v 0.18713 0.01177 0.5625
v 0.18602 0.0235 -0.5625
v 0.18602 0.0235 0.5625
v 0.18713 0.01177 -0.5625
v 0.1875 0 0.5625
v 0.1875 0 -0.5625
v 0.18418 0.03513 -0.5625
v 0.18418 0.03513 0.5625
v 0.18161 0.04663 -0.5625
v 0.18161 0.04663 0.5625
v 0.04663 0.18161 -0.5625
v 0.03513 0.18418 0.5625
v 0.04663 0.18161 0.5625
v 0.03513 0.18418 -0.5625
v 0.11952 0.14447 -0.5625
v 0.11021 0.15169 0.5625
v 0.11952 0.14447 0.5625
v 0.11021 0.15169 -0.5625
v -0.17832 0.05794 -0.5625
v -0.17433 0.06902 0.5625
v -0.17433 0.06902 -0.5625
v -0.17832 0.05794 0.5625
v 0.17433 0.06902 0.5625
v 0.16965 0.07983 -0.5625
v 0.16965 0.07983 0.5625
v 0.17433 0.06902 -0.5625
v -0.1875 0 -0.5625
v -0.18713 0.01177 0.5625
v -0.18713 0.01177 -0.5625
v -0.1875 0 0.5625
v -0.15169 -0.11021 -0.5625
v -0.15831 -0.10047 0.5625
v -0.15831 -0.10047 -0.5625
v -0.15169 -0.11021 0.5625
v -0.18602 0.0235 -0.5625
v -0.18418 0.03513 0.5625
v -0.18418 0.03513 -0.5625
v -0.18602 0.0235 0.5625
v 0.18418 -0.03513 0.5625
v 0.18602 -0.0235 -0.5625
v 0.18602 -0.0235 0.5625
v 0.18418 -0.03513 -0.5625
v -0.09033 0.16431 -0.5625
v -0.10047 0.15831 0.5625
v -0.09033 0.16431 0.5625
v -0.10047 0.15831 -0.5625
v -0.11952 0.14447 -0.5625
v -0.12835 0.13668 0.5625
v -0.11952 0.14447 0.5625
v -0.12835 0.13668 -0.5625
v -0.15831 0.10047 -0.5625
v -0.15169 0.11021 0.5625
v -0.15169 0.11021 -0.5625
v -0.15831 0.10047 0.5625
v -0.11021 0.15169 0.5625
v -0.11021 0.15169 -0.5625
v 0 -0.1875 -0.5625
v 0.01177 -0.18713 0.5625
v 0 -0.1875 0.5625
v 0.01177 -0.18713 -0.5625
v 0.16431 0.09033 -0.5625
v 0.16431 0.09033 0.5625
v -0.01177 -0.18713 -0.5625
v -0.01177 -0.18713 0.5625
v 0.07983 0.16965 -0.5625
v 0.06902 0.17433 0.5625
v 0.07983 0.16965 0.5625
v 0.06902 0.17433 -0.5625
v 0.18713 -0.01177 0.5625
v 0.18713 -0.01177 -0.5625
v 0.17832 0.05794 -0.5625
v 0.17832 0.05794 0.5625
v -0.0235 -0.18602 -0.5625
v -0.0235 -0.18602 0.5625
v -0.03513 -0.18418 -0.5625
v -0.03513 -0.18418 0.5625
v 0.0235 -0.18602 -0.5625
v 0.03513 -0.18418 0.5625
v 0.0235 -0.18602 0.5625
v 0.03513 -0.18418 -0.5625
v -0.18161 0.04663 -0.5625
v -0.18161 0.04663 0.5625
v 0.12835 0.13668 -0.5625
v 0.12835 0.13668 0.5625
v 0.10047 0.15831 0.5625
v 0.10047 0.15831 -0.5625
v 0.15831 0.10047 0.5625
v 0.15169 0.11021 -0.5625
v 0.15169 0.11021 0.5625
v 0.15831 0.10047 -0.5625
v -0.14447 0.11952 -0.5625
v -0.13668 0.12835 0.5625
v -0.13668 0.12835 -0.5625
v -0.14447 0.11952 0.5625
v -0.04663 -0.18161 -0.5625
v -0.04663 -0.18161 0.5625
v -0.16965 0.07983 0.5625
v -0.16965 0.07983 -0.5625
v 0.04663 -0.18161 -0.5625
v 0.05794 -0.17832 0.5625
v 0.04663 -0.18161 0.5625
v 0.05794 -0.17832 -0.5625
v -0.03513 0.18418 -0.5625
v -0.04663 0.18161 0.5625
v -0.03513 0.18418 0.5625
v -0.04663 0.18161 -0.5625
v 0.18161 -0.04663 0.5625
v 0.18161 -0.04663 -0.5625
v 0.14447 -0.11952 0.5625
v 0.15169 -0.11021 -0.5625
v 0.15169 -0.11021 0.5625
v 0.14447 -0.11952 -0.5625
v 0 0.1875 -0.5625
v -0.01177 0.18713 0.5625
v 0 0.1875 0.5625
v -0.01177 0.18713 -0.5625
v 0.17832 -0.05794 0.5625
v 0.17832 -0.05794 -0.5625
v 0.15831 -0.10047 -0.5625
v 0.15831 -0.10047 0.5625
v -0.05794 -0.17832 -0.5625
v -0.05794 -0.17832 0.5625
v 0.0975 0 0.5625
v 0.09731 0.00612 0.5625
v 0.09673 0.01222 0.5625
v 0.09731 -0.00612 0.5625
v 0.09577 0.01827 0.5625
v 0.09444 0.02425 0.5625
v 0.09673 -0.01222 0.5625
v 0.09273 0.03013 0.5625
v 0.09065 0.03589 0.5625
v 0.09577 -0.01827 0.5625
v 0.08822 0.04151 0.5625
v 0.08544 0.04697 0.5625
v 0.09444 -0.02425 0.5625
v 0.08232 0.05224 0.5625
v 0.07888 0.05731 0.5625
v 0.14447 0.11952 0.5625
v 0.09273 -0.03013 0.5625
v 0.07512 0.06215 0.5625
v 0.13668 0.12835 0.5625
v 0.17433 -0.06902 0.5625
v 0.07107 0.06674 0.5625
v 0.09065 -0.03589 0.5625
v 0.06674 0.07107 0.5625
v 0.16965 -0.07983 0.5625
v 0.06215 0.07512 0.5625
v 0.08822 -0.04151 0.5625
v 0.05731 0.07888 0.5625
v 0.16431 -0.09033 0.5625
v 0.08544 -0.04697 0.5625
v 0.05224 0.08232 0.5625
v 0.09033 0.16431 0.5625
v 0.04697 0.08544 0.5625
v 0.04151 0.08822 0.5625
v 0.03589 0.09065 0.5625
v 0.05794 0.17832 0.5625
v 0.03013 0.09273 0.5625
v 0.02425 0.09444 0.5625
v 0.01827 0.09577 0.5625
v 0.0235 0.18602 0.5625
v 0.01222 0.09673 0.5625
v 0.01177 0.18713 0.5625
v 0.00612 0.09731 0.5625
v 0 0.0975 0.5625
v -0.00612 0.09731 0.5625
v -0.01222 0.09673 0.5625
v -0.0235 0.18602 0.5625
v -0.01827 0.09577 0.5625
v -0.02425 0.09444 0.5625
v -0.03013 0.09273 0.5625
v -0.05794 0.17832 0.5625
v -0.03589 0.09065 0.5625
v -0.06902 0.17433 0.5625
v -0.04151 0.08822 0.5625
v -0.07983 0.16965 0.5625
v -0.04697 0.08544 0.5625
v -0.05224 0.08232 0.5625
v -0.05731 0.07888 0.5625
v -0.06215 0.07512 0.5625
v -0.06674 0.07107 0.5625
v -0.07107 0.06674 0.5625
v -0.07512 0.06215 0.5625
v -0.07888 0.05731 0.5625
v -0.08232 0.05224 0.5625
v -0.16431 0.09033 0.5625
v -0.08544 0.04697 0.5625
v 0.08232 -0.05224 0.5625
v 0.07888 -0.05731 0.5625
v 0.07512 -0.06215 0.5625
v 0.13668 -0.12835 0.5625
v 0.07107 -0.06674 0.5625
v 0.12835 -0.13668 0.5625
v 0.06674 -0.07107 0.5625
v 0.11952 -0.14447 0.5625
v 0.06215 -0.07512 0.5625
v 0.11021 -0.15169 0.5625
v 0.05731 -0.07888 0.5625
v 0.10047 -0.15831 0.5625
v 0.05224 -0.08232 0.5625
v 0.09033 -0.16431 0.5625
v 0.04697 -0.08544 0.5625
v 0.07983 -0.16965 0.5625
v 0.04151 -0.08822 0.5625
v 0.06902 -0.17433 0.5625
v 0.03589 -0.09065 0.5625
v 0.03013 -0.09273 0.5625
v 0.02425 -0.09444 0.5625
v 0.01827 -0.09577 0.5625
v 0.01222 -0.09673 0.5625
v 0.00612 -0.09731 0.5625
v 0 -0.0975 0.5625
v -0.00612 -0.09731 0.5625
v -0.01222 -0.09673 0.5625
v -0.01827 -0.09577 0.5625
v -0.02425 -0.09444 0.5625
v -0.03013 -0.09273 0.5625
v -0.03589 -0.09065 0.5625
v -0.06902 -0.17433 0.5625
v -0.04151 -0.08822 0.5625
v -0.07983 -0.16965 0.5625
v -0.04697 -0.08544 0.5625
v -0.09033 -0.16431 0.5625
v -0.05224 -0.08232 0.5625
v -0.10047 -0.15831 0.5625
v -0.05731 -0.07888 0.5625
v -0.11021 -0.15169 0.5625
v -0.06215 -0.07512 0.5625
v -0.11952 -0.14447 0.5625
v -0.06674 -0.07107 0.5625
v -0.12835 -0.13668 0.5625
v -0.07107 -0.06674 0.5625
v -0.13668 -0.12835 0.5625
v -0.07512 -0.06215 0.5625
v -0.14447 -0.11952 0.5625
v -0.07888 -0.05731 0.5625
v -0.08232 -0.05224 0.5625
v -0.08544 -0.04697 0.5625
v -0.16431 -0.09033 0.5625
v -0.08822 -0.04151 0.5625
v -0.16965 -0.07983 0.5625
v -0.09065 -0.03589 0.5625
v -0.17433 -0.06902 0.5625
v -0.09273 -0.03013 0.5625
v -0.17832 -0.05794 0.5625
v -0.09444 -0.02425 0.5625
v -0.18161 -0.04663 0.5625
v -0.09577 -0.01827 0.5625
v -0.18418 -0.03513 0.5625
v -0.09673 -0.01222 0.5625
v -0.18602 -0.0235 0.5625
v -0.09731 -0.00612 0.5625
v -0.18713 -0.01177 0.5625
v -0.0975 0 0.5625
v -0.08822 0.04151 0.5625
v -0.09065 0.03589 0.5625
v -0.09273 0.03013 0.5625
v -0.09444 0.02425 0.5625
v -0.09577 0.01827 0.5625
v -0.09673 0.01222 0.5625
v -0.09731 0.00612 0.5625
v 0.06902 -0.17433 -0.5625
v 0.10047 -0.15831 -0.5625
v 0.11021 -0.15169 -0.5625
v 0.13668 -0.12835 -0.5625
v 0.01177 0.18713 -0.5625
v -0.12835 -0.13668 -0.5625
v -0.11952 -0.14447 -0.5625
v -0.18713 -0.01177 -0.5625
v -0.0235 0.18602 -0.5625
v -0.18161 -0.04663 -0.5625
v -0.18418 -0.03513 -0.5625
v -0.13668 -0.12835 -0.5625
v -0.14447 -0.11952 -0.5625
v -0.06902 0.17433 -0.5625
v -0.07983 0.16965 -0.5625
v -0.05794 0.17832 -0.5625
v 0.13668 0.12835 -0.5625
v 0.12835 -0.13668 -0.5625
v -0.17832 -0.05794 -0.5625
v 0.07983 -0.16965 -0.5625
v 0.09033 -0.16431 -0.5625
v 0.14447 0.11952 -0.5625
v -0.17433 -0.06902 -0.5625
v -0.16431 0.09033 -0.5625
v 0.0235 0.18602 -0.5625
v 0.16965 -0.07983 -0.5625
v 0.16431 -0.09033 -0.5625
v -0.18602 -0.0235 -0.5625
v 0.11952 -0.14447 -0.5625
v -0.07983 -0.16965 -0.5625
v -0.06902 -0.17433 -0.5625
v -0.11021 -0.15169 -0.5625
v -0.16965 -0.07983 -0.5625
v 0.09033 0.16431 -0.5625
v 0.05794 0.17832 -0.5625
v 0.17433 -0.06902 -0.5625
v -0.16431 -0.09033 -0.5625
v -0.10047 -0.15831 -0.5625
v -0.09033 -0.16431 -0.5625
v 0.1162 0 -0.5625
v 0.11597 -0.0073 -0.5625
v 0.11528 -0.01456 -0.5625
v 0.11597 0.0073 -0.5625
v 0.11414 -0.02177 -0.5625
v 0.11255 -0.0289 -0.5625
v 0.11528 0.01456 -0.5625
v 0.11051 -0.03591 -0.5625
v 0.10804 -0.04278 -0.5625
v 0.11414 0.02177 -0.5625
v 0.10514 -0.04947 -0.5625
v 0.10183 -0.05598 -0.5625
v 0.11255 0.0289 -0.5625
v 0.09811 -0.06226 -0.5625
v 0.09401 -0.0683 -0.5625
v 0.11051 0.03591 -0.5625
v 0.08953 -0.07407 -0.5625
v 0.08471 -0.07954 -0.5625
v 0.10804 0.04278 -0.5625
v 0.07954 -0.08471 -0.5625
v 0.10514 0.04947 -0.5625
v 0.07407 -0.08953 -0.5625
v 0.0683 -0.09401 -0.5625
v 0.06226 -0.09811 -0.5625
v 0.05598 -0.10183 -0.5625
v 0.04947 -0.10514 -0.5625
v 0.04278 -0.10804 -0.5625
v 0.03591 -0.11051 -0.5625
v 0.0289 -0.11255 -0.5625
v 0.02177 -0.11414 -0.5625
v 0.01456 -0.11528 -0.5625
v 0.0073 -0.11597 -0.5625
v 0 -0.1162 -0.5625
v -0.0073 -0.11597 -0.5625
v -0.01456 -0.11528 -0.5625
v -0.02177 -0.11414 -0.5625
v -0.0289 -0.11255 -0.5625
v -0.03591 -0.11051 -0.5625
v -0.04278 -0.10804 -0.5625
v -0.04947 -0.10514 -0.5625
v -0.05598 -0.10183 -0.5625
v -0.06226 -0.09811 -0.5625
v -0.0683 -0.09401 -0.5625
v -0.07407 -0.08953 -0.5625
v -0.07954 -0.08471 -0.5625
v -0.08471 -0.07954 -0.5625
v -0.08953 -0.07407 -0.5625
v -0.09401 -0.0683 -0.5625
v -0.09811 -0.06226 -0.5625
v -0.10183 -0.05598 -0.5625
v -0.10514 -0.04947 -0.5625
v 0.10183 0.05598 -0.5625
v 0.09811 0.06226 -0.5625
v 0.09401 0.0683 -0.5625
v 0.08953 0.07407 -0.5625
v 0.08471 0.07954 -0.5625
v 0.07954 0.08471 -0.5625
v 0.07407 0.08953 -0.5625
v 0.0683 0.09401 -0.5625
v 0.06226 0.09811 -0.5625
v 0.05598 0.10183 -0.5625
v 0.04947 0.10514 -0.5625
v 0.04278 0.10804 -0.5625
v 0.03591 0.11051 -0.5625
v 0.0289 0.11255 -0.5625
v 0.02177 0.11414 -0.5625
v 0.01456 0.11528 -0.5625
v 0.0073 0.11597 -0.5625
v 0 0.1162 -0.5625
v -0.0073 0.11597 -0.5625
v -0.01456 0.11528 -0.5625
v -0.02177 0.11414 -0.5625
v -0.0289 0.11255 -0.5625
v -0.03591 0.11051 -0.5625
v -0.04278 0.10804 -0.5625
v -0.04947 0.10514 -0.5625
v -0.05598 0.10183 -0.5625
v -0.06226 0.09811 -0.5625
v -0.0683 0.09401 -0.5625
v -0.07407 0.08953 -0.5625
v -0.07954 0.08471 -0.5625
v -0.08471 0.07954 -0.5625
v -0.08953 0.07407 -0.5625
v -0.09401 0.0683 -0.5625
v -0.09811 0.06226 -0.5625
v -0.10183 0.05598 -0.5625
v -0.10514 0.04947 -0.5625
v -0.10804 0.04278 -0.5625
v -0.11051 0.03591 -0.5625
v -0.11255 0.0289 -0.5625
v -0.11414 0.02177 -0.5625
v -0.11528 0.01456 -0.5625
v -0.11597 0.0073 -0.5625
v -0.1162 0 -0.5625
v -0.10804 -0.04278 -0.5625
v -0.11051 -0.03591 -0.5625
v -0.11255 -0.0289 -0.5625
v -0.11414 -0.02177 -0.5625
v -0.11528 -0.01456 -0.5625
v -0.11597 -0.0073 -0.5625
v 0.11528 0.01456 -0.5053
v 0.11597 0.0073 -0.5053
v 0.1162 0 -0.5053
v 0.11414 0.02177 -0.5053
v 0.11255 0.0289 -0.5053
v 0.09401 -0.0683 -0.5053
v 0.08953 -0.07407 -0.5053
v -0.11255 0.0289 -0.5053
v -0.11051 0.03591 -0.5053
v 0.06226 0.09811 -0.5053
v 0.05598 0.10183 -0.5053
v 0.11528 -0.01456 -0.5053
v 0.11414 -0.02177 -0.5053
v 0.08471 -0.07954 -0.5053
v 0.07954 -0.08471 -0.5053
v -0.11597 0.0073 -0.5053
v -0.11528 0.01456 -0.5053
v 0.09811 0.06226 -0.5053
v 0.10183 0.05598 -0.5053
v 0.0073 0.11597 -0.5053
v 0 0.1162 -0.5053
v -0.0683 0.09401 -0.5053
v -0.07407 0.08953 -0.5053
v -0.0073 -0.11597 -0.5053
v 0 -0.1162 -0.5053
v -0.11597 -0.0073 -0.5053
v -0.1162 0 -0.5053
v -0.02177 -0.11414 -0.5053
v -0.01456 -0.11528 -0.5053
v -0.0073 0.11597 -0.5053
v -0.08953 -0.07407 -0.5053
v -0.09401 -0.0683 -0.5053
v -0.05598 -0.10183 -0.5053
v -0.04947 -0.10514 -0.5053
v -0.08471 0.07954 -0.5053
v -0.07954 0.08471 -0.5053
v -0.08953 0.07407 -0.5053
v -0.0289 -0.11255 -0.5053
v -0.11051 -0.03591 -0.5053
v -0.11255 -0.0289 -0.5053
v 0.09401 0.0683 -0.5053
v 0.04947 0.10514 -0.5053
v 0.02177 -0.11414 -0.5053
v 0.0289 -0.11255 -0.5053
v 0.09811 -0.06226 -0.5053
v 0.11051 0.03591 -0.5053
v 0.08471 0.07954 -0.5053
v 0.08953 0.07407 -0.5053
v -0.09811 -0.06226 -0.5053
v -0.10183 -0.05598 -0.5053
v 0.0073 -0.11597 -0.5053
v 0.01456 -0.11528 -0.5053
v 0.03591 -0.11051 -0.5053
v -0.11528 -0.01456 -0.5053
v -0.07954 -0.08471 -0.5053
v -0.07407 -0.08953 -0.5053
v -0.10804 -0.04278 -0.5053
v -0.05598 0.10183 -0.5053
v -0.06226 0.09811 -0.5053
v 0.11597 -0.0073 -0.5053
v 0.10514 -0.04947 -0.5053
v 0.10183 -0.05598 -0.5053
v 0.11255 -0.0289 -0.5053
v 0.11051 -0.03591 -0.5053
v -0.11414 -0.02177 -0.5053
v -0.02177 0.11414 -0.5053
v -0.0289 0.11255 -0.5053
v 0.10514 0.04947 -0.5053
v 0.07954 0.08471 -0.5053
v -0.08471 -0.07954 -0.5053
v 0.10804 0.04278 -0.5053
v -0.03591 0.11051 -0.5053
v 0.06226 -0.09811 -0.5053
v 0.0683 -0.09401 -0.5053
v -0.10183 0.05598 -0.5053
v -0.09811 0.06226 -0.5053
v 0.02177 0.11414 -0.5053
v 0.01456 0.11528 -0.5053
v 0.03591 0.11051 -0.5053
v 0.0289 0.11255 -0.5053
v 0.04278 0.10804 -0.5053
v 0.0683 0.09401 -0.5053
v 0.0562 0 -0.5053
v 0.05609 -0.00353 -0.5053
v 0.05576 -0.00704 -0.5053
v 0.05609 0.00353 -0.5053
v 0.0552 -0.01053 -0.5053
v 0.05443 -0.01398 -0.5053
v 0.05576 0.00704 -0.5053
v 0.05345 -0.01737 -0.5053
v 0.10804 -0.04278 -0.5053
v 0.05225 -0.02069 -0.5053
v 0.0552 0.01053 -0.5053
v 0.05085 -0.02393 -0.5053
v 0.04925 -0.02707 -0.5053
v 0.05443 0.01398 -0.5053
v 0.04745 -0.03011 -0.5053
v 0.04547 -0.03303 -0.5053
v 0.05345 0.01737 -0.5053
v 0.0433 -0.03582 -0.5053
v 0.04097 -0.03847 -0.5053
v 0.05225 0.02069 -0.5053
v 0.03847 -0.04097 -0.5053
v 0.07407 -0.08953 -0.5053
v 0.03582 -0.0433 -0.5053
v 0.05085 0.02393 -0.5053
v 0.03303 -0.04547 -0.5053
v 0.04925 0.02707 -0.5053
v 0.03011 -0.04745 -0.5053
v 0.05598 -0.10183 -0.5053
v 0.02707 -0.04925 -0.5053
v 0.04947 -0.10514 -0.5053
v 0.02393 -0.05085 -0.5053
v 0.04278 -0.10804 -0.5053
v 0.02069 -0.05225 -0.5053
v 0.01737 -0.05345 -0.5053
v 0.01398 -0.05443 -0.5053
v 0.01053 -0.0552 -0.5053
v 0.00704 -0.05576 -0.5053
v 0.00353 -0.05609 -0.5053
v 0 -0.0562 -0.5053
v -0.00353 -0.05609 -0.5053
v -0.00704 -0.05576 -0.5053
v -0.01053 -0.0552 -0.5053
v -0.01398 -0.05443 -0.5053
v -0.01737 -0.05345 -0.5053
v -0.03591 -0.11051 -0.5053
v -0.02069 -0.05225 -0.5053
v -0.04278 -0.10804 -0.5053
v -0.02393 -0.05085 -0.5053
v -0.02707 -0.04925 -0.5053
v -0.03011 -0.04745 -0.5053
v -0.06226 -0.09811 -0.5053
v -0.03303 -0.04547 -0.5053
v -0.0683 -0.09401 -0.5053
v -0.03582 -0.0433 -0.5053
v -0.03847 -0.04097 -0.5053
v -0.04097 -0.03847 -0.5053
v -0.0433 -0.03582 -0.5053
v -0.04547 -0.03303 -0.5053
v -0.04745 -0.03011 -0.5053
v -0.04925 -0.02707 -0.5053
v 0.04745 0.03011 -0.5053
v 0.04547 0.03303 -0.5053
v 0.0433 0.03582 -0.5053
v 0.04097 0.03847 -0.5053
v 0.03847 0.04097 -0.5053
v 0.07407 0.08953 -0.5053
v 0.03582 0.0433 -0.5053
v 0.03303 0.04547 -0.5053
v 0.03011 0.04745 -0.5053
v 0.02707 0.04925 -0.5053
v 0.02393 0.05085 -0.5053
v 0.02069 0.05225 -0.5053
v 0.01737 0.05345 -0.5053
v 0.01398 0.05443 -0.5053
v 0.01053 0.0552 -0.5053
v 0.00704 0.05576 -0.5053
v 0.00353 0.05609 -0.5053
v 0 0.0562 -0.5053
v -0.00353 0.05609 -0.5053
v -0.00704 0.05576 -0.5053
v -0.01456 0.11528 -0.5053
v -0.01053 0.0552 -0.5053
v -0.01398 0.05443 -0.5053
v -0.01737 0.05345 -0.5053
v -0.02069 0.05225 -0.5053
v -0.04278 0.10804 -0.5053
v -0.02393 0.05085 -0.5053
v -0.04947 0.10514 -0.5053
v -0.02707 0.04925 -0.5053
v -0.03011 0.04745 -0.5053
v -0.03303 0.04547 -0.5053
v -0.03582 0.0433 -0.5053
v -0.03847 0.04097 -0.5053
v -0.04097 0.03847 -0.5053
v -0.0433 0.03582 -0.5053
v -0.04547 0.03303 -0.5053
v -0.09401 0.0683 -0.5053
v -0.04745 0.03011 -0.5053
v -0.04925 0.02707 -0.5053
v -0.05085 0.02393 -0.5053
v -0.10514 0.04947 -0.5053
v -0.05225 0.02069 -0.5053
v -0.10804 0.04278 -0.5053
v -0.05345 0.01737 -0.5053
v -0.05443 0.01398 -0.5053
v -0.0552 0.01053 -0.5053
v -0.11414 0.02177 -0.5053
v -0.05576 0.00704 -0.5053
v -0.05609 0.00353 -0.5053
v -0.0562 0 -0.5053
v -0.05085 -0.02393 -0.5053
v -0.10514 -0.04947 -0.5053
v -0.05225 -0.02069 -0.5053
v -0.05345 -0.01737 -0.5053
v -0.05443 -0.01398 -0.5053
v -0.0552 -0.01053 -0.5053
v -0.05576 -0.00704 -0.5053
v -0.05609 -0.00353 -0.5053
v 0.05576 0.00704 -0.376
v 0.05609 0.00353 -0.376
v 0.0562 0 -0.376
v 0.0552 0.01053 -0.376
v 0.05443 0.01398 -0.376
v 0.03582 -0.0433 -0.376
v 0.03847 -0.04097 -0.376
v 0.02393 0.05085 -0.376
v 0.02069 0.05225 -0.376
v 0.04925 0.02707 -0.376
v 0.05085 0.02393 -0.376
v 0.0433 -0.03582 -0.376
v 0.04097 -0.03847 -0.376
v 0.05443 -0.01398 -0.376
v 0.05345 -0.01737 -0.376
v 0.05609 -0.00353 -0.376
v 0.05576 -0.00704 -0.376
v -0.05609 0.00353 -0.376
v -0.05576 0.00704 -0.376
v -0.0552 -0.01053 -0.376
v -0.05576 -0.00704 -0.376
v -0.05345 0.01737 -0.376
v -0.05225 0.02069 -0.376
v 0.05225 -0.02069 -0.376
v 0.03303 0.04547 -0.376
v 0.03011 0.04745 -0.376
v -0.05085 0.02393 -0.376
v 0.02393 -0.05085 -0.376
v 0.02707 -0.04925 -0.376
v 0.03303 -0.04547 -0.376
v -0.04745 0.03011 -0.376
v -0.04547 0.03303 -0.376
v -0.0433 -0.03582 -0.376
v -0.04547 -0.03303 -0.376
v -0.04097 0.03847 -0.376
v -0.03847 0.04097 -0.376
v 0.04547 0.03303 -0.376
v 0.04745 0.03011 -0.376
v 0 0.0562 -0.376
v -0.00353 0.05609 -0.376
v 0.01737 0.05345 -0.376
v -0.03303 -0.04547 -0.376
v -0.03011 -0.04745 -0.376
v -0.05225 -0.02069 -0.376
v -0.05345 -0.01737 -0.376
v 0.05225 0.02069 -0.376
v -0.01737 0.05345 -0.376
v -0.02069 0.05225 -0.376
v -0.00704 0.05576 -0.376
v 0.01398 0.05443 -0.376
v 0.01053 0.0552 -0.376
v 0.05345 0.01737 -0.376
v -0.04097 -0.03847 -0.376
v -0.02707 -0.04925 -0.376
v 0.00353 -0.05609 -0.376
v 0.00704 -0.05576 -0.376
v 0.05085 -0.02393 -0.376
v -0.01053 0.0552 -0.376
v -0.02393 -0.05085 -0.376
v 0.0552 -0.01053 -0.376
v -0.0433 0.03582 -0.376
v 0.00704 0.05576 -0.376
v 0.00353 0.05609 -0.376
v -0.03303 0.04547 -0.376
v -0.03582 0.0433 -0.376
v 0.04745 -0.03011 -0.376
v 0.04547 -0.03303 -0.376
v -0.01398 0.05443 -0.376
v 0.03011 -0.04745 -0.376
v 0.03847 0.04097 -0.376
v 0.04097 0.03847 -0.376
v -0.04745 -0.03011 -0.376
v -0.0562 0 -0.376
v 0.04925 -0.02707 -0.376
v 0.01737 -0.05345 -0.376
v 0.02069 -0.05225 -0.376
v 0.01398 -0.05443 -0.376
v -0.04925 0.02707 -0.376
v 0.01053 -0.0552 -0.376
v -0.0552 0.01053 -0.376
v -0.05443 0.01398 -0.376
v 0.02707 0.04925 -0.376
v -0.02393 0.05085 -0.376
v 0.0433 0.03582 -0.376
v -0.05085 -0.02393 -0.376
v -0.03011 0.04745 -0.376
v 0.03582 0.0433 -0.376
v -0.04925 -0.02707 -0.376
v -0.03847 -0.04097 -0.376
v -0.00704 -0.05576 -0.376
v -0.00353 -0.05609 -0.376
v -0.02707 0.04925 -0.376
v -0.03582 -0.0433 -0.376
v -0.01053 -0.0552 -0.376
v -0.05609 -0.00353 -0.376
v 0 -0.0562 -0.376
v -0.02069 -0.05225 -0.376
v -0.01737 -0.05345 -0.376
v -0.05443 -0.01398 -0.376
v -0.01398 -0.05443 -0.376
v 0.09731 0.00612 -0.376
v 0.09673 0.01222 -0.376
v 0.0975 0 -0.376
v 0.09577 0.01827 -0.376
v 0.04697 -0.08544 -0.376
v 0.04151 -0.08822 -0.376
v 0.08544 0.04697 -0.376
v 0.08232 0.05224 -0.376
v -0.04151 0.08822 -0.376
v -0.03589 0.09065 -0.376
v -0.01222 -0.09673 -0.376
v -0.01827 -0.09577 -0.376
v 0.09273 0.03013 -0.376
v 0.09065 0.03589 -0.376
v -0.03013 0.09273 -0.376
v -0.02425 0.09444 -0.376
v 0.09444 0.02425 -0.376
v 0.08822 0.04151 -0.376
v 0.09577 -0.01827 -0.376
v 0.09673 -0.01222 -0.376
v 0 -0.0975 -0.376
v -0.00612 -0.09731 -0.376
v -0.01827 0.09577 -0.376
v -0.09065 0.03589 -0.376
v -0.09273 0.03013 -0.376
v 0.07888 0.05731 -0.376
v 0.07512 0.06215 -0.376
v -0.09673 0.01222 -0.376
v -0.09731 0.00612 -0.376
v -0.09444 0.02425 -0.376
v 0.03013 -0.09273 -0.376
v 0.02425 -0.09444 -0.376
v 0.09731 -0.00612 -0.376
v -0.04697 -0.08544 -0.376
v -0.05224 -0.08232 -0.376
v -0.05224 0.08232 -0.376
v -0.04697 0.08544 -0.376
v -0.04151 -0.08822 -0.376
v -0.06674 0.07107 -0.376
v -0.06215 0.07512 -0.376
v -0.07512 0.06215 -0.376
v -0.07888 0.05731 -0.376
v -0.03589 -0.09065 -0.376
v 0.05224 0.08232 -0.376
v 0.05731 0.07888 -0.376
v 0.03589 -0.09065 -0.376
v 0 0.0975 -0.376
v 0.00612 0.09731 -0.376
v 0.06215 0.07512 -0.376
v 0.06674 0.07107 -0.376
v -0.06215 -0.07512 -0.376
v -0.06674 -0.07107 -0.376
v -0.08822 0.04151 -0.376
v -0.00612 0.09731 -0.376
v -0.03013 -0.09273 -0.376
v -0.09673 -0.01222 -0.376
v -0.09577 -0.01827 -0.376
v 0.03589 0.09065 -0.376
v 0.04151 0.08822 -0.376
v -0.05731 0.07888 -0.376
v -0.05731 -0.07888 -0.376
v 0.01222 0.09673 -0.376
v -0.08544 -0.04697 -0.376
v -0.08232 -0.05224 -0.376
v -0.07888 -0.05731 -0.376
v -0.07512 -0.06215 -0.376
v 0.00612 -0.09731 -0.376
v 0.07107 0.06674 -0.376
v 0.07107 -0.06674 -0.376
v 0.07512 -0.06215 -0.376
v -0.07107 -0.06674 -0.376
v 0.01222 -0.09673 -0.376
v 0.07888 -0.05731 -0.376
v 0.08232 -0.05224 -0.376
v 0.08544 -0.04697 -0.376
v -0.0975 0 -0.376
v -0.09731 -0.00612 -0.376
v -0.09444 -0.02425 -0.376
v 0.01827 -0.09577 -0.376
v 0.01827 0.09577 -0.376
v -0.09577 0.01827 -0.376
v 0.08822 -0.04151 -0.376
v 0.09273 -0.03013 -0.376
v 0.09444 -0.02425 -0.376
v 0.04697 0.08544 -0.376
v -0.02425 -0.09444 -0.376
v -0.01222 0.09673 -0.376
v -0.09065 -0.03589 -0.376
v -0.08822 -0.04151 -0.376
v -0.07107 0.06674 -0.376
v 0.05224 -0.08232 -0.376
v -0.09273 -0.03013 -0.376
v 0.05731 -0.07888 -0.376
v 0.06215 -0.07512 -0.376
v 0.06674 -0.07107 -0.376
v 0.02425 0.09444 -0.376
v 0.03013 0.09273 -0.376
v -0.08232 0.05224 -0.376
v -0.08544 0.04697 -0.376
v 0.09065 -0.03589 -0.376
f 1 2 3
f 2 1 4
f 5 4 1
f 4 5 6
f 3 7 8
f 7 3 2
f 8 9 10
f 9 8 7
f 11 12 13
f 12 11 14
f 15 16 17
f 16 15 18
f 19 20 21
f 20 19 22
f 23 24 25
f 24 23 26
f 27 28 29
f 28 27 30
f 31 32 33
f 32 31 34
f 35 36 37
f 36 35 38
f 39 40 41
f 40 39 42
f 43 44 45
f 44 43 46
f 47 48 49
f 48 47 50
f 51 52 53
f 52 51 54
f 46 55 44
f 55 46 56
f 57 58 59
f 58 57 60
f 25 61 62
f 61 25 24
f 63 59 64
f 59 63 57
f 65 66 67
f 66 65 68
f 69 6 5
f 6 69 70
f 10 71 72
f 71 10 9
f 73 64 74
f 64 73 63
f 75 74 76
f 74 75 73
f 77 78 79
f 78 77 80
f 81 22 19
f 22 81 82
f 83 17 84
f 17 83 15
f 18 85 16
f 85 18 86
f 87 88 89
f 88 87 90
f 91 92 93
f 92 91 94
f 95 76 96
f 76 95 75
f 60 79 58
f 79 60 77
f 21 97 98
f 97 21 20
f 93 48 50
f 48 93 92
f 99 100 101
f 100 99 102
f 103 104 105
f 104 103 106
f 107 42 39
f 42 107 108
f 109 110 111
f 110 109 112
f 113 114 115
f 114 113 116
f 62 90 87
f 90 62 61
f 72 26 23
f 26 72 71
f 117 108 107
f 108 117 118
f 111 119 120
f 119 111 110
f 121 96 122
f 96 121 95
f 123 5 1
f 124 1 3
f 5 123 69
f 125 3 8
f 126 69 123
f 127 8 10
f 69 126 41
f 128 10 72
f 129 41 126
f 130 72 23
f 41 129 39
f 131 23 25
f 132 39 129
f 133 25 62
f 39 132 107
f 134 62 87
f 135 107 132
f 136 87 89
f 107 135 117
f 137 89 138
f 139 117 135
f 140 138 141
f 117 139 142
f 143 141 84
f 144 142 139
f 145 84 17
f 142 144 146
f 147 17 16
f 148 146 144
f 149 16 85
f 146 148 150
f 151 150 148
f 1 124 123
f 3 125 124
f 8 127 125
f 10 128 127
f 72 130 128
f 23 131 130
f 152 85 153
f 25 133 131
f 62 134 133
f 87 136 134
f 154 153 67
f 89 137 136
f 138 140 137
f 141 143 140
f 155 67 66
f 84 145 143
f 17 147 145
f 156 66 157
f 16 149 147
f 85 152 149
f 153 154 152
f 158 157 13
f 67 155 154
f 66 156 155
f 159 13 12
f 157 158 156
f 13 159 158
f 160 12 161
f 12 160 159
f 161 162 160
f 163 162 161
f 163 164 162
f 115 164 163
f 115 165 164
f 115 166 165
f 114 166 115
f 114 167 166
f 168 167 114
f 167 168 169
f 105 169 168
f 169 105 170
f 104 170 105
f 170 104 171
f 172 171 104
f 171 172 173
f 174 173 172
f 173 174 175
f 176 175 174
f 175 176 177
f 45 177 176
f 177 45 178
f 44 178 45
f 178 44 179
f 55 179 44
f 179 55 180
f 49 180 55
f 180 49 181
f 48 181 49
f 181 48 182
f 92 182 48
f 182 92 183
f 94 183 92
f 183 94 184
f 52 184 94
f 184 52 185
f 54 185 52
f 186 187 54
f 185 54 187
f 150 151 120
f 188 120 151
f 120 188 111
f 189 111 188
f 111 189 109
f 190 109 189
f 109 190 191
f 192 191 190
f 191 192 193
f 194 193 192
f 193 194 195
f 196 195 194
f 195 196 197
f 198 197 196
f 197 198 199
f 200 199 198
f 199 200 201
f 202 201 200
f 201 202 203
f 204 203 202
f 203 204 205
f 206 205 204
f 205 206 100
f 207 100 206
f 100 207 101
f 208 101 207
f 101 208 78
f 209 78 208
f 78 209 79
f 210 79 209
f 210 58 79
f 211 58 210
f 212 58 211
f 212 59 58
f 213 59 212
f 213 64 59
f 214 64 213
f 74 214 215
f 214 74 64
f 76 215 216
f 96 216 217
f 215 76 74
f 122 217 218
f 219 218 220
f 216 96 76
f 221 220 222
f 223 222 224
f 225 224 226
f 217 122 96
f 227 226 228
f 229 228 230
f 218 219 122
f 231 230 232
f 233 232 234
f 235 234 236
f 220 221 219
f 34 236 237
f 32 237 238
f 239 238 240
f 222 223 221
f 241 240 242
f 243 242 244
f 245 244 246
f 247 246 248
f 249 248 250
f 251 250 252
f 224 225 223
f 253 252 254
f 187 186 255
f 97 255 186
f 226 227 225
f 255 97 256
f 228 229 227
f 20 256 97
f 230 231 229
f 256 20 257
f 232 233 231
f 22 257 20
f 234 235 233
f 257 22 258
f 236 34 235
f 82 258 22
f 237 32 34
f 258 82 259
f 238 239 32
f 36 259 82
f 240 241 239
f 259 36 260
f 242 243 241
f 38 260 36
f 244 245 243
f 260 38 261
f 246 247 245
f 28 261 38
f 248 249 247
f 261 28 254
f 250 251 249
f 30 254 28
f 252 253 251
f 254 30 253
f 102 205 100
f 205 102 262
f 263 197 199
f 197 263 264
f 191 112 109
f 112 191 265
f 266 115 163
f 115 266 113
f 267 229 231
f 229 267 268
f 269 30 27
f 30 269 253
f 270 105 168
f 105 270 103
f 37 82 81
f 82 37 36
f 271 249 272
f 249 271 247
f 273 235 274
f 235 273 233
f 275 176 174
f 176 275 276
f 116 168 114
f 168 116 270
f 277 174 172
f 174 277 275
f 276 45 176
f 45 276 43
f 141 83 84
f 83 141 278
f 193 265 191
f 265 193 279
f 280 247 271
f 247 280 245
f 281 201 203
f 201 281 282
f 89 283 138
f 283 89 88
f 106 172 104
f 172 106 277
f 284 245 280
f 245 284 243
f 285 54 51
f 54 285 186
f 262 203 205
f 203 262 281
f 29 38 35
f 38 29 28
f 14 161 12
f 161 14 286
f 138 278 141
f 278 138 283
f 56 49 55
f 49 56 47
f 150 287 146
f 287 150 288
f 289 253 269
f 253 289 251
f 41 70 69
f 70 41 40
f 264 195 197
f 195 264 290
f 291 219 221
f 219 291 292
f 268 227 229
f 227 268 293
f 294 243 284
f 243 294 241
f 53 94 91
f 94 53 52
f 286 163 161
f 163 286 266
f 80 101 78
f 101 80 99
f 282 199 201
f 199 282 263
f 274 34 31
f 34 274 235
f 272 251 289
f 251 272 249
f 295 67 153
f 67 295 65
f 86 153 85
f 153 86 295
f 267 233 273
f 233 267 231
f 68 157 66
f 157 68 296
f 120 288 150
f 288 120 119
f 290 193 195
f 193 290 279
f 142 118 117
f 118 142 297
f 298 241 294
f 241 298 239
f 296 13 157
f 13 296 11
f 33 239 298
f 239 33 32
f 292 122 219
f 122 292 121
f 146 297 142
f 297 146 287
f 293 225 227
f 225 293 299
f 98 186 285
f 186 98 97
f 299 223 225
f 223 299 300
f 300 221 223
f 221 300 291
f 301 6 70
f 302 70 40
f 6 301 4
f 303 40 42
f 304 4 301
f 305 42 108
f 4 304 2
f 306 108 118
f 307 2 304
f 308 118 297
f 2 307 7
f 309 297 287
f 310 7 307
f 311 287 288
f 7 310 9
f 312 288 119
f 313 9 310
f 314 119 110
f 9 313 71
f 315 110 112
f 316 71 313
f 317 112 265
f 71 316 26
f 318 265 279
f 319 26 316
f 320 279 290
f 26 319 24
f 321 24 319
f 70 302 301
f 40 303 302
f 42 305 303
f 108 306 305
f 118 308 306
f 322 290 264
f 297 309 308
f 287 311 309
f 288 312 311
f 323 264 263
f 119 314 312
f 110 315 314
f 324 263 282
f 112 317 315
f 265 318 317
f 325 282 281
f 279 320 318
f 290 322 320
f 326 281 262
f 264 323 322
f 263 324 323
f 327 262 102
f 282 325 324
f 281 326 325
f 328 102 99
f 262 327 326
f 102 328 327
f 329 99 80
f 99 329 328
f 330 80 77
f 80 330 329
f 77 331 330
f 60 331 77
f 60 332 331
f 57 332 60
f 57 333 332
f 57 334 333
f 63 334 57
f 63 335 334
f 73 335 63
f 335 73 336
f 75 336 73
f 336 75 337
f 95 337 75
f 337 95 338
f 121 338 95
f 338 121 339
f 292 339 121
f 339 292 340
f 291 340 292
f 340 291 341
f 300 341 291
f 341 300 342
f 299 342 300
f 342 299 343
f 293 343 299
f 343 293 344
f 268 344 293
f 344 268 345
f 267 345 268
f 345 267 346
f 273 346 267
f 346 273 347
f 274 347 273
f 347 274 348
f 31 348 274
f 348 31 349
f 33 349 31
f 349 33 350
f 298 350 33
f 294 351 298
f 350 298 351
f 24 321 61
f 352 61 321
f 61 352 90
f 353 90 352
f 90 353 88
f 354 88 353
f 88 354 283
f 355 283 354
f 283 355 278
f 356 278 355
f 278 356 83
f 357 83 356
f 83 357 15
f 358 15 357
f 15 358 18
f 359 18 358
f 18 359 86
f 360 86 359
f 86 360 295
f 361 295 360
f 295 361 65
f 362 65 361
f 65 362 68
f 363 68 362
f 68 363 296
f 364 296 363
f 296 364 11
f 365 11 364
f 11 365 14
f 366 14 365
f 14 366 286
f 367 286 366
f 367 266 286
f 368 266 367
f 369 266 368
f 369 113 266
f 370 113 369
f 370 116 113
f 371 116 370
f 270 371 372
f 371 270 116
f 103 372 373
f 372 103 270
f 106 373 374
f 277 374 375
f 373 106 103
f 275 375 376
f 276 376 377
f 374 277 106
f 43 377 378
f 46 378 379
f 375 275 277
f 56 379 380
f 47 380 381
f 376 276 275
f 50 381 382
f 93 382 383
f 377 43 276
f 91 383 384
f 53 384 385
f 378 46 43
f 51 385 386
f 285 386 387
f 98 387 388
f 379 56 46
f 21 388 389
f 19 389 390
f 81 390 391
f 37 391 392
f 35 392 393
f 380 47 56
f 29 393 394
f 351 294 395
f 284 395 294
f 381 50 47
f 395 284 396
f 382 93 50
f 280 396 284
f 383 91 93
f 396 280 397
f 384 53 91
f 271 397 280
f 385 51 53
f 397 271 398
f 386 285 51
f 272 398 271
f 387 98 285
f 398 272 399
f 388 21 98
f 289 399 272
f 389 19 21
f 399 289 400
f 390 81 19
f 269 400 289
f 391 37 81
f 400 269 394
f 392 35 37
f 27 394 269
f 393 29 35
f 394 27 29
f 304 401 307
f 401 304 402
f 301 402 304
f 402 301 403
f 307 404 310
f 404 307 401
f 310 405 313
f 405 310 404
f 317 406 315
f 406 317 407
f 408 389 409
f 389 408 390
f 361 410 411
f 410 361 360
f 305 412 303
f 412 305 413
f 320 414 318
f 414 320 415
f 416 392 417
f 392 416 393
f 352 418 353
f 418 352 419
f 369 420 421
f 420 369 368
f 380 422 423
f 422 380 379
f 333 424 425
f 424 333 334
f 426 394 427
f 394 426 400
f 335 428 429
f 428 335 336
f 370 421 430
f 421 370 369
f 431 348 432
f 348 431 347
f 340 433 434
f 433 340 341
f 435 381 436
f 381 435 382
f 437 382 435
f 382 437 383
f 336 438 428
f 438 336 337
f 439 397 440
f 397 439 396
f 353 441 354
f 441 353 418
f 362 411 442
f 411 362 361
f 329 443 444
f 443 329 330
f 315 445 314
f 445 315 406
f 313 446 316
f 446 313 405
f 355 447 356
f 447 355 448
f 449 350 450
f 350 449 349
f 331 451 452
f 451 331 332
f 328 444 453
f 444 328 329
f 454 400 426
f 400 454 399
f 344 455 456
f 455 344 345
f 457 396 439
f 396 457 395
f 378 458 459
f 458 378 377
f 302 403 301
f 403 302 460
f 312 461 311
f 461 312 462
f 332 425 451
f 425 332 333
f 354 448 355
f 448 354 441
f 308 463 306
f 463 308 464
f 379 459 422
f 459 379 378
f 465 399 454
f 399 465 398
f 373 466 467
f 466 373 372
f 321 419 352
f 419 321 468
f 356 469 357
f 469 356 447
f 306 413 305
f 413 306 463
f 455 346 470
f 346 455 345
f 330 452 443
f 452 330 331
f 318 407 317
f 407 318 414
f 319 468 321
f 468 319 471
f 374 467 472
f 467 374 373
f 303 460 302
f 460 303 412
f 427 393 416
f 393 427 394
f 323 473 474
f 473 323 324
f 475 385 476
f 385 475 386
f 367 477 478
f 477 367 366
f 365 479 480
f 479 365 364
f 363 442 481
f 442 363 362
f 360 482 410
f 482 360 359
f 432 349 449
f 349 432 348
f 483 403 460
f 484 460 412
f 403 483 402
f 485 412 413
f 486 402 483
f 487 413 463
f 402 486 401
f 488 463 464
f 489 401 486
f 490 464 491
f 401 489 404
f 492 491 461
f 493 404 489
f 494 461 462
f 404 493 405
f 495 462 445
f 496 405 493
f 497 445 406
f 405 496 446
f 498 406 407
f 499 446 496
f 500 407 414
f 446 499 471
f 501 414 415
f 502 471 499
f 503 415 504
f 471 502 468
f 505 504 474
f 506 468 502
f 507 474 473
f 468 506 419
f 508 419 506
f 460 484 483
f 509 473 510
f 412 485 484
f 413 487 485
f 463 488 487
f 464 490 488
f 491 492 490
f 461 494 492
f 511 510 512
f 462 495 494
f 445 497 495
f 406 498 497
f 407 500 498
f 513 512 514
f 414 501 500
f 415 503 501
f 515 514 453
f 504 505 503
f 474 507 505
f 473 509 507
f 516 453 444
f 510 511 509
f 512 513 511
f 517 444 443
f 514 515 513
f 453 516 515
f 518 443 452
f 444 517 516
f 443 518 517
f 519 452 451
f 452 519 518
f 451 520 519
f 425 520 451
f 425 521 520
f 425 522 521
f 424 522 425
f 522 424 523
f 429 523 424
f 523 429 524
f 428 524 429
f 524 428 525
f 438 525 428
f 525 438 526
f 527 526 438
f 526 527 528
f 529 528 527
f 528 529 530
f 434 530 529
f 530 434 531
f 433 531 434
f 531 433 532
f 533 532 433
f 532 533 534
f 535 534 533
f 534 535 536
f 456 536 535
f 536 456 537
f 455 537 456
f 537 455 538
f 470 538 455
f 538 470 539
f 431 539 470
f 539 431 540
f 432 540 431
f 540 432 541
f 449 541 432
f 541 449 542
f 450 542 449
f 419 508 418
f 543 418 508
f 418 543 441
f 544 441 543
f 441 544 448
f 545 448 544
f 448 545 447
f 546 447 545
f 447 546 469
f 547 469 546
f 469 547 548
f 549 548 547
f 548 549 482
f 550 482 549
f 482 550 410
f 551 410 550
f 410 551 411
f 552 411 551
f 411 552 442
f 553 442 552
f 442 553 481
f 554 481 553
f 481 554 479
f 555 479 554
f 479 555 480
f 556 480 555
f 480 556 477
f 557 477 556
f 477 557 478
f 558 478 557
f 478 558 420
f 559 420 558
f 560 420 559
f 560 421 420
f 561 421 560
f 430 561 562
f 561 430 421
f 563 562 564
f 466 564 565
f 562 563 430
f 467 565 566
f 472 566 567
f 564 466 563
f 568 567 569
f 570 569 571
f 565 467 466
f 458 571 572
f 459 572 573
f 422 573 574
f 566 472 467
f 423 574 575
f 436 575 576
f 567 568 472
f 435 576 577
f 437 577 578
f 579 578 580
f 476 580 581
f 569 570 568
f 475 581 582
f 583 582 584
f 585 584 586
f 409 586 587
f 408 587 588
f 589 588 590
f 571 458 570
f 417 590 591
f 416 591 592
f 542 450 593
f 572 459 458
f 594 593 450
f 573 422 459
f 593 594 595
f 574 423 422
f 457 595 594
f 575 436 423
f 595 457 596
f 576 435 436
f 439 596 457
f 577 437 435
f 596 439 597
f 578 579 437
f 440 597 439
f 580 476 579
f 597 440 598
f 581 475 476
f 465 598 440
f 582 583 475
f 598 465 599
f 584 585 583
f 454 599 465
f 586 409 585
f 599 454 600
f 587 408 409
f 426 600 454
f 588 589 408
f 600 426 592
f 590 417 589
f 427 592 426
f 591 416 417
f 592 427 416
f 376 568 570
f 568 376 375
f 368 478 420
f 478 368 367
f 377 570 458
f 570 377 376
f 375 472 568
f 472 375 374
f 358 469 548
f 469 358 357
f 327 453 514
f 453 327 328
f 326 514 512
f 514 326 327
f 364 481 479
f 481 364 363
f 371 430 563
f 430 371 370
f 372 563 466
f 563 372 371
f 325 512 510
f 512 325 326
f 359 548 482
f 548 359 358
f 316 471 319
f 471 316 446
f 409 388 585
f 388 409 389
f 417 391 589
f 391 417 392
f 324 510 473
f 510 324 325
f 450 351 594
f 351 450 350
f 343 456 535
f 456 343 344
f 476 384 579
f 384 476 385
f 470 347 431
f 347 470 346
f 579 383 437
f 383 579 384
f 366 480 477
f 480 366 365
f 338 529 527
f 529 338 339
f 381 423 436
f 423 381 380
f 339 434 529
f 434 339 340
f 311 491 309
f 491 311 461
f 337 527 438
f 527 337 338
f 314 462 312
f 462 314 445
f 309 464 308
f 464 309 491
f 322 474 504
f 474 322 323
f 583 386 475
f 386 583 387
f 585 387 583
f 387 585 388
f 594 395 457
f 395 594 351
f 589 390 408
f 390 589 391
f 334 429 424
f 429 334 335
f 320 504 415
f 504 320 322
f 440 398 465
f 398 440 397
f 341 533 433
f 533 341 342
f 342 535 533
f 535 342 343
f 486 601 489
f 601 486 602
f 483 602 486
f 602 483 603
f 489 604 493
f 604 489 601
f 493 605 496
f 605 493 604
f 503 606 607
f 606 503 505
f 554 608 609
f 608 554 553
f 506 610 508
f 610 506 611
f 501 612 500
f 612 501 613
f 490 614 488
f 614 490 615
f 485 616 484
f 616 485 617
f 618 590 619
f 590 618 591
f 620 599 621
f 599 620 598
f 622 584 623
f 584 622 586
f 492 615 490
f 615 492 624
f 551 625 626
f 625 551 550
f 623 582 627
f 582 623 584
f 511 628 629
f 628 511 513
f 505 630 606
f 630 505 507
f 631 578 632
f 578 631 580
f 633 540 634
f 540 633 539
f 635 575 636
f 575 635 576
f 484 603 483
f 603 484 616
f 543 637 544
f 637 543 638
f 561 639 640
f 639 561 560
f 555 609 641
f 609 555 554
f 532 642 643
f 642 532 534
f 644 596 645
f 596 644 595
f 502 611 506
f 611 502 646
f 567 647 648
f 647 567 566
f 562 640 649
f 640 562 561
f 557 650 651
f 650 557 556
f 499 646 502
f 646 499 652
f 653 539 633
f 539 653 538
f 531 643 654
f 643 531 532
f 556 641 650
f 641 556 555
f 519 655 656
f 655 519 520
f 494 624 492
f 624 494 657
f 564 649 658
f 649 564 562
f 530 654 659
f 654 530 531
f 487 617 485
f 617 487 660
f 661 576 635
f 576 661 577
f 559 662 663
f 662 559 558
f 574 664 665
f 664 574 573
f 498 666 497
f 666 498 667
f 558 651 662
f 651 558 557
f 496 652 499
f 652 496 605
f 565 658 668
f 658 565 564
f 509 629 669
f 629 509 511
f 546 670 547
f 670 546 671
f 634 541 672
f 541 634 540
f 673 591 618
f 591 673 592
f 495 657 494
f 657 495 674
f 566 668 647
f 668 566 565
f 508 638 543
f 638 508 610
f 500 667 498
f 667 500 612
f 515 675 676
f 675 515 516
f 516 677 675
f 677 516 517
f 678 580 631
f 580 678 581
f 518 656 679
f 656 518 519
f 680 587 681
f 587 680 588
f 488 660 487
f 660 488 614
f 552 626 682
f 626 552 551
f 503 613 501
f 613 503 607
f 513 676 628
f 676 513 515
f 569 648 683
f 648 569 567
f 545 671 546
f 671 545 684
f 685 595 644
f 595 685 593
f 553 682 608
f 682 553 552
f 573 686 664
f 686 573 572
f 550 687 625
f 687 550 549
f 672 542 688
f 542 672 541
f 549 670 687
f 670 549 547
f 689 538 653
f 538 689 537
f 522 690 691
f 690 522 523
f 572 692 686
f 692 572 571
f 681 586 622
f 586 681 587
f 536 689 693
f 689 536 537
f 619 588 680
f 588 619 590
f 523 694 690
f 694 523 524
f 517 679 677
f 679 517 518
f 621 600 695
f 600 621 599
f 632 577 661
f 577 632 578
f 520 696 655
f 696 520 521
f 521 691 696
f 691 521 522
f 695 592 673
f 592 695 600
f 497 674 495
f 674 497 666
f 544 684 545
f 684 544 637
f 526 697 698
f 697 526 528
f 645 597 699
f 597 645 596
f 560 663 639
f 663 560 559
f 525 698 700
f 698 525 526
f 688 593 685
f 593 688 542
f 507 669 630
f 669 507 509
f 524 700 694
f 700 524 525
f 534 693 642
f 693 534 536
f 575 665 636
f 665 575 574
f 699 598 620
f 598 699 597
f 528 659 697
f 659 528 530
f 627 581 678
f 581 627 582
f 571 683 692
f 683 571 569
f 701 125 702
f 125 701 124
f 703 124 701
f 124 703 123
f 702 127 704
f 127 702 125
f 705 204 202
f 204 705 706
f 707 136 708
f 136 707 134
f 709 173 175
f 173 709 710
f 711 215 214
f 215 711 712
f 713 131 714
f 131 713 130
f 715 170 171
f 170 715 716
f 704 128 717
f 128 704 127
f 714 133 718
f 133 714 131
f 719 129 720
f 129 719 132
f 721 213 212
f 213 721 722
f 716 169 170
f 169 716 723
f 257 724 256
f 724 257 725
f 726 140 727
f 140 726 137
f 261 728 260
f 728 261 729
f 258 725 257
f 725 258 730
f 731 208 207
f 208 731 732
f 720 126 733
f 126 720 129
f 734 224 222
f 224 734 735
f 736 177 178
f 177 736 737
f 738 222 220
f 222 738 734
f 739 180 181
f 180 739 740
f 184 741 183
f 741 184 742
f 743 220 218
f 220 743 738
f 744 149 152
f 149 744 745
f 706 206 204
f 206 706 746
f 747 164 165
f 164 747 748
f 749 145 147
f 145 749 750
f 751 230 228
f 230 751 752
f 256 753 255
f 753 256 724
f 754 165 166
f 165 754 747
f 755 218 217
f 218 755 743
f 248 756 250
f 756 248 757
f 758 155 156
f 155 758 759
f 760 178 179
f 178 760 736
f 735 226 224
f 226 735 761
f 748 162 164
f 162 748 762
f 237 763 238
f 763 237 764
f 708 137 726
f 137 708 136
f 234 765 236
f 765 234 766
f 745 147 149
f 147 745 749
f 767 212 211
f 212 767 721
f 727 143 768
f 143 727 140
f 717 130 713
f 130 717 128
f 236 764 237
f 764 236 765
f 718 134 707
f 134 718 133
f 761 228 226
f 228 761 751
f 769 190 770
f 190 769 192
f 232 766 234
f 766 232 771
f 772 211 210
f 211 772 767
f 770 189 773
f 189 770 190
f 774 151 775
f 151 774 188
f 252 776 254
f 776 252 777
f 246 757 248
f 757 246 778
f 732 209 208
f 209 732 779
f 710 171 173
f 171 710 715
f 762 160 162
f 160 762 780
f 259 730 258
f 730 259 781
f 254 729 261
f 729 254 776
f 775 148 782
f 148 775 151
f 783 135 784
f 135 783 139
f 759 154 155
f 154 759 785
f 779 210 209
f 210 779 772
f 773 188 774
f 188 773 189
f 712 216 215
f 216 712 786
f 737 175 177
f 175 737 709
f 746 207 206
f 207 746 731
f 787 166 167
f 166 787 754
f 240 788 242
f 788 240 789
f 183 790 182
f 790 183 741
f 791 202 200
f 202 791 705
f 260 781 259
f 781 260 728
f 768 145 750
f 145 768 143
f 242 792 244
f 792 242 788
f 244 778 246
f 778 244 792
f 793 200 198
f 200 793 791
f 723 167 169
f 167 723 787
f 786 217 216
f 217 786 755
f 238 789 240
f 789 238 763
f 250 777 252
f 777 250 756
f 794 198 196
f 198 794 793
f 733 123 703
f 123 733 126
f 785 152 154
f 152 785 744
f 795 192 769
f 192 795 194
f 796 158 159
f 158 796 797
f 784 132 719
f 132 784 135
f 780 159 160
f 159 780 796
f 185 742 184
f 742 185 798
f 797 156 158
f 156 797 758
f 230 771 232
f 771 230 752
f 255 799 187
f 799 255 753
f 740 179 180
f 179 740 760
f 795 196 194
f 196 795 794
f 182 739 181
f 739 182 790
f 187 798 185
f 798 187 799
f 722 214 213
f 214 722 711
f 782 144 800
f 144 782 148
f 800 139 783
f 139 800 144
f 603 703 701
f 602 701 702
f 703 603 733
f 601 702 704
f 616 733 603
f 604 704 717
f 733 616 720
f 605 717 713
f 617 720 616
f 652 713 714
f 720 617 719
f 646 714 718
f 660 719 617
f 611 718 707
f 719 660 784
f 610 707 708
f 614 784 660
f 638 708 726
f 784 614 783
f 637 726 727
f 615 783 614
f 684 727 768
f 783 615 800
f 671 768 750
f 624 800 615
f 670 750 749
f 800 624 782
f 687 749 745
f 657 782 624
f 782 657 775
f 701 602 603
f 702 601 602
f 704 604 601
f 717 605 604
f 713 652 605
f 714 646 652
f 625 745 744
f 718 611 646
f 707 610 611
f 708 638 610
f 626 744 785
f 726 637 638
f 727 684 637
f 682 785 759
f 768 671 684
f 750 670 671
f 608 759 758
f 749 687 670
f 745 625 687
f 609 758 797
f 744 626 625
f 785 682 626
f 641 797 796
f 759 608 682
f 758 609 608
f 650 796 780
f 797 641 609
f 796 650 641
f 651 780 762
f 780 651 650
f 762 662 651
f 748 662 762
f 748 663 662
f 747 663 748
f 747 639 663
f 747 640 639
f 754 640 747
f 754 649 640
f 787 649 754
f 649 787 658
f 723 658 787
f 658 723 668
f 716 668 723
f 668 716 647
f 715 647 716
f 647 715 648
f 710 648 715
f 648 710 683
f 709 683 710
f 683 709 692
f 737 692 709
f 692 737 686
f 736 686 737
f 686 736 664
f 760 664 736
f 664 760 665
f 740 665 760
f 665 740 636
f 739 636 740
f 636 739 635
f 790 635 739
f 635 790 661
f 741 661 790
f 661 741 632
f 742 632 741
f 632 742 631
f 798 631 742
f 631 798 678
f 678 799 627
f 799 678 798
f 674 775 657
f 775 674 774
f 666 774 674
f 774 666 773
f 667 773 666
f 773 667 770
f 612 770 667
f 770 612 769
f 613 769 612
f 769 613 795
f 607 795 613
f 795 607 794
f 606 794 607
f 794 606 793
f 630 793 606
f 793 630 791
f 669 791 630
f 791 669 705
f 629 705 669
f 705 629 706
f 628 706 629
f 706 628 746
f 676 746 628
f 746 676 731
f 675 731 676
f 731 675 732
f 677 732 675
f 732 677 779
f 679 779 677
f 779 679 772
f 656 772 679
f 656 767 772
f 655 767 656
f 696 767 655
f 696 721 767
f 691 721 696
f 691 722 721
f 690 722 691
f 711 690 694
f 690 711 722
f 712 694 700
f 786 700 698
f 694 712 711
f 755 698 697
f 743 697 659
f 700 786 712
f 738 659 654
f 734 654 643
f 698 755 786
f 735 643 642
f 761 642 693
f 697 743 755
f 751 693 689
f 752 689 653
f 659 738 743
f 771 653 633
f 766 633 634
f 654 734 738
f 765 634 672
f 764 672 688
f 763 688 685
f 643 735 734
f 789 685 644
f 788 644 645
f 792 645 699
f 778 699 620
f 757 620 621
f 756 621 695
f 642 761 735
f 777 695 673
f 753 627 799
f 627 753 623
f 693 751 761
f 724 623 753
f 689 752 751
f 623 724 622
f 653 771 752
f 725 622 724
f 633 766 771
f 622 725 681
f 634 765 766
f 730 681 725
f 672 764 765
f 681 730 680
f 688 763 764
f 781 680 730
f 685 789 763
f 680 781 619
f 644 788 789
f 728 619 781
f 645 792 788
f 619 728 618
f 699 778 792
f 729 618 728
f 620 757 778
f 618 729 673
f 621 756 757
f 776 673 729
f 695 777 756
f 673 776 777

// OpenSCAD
// Stepped cylindrical part with internal bores and annular recesses

// --- Solid body parameters ---
upper_r = 0.1875;       // Upper section radius
upper_h = 0.5625;      // Upper section height from shoulder (z=0 to z=+0.5625)
lower_r = 0.1875;       // Lower section radius
lower_h = 0.5625;      // Lower section height from shoulder (z=-0.5625 to z=0)

// --- Positive side bore parameters ---
pos_bore_r1 = 0.0975;      // Large bore radius
pos_bore_reach1 = 0.9375;  // Reach depth from top surface
pos_bore_r2 = 0.0534;      // Small bore radius
pos_bore_reach2 = 0.9375;  // Reach depth from top surface

// --- Negative side bore parameters ---
neg_bore_r = 0.0562;       // Central bore radius
neg_bore_reach = 0.375;    // Reach depth from bottom surface

// --- Negative side annular recess parameters ---
recess1_ri = 0.0562;       // Recess 1 inner radius
recess1_ro = 0.1162;       // Recess 1 outer radius
recess1_depth = 0.0562;    // Recess 1 depth from bottom surface

recess2_ri = 0.0562;       // Recess 2 inner radius
recess2_ro = 0.075;        // Recess 2 outer radius
recess2_depth = 0.0562;    // Recess 2 depth from bottom surface

$fn = 100;
eps = 0.001; // Small overlap for clean boolean operations

difference() {
    // Main solid body: two attached circular sections sharing shoulder at z=0
    union() {
        // Upper section: z=0 to z=upper_h
        cylinder(r=upper_r, h=upper_h);
        // Lower section: z=-lower_h to z=0
        translate([0, 0, -lower_h])
            cylinder(r=lower_r, h=lower_h);
    }

    // Positive side: large bore (r=0.0975, depth 0.9375 from top)
    // Extends from z=upper_h down to z=upper_h - pos_bore_reach1
    translate([0, 0, upper_h - pos_bore_reach1 - eps])
        cylinder(r=pos_bore_r1, h=pos_bore_reach1 + 2*eps);

    // Positive side: small bore (r=0.0534, depth 0.9375 from top)
    translate([0, 0, upper_h - pos_bore_reach2 - eps])
        cylinder(r=pos_bore_r2, h=pos_bore_reach2 + 2*eps);

    // Negative side: central bore (r=0.0562, depth 0.375 from bottom)
    // Extends from z=-lower_h upward by neg_bore_reach
    translate([0, 0, -lower_h - eps])
        cylinder(r=neg_bore_r, h=neg_bore_reach + 2*eps);

    // Negative side: annular recess 1 (ring between r=0.0562 and r=0.1162)
    translate([0, 0, -lower_h - eps])
        difference() {
            cylinder(r=recess1_ro, h=recess1_depth + 2*eps);
            cylinder(r=recess1_ri, h=recess1_depth + 2*eps);
        }

    // Negative side: annular recess 2 (ring between r=0.0562 and r=0.075)
    translate([0, 0, -lower_h - eps])
        difference() {
            cylinder(r=recess2_ro, h=recess2_depth + 2*eps);
            cylinder(r=recess2_ri, h=recess2_depth + 2*eps);
        }
}
